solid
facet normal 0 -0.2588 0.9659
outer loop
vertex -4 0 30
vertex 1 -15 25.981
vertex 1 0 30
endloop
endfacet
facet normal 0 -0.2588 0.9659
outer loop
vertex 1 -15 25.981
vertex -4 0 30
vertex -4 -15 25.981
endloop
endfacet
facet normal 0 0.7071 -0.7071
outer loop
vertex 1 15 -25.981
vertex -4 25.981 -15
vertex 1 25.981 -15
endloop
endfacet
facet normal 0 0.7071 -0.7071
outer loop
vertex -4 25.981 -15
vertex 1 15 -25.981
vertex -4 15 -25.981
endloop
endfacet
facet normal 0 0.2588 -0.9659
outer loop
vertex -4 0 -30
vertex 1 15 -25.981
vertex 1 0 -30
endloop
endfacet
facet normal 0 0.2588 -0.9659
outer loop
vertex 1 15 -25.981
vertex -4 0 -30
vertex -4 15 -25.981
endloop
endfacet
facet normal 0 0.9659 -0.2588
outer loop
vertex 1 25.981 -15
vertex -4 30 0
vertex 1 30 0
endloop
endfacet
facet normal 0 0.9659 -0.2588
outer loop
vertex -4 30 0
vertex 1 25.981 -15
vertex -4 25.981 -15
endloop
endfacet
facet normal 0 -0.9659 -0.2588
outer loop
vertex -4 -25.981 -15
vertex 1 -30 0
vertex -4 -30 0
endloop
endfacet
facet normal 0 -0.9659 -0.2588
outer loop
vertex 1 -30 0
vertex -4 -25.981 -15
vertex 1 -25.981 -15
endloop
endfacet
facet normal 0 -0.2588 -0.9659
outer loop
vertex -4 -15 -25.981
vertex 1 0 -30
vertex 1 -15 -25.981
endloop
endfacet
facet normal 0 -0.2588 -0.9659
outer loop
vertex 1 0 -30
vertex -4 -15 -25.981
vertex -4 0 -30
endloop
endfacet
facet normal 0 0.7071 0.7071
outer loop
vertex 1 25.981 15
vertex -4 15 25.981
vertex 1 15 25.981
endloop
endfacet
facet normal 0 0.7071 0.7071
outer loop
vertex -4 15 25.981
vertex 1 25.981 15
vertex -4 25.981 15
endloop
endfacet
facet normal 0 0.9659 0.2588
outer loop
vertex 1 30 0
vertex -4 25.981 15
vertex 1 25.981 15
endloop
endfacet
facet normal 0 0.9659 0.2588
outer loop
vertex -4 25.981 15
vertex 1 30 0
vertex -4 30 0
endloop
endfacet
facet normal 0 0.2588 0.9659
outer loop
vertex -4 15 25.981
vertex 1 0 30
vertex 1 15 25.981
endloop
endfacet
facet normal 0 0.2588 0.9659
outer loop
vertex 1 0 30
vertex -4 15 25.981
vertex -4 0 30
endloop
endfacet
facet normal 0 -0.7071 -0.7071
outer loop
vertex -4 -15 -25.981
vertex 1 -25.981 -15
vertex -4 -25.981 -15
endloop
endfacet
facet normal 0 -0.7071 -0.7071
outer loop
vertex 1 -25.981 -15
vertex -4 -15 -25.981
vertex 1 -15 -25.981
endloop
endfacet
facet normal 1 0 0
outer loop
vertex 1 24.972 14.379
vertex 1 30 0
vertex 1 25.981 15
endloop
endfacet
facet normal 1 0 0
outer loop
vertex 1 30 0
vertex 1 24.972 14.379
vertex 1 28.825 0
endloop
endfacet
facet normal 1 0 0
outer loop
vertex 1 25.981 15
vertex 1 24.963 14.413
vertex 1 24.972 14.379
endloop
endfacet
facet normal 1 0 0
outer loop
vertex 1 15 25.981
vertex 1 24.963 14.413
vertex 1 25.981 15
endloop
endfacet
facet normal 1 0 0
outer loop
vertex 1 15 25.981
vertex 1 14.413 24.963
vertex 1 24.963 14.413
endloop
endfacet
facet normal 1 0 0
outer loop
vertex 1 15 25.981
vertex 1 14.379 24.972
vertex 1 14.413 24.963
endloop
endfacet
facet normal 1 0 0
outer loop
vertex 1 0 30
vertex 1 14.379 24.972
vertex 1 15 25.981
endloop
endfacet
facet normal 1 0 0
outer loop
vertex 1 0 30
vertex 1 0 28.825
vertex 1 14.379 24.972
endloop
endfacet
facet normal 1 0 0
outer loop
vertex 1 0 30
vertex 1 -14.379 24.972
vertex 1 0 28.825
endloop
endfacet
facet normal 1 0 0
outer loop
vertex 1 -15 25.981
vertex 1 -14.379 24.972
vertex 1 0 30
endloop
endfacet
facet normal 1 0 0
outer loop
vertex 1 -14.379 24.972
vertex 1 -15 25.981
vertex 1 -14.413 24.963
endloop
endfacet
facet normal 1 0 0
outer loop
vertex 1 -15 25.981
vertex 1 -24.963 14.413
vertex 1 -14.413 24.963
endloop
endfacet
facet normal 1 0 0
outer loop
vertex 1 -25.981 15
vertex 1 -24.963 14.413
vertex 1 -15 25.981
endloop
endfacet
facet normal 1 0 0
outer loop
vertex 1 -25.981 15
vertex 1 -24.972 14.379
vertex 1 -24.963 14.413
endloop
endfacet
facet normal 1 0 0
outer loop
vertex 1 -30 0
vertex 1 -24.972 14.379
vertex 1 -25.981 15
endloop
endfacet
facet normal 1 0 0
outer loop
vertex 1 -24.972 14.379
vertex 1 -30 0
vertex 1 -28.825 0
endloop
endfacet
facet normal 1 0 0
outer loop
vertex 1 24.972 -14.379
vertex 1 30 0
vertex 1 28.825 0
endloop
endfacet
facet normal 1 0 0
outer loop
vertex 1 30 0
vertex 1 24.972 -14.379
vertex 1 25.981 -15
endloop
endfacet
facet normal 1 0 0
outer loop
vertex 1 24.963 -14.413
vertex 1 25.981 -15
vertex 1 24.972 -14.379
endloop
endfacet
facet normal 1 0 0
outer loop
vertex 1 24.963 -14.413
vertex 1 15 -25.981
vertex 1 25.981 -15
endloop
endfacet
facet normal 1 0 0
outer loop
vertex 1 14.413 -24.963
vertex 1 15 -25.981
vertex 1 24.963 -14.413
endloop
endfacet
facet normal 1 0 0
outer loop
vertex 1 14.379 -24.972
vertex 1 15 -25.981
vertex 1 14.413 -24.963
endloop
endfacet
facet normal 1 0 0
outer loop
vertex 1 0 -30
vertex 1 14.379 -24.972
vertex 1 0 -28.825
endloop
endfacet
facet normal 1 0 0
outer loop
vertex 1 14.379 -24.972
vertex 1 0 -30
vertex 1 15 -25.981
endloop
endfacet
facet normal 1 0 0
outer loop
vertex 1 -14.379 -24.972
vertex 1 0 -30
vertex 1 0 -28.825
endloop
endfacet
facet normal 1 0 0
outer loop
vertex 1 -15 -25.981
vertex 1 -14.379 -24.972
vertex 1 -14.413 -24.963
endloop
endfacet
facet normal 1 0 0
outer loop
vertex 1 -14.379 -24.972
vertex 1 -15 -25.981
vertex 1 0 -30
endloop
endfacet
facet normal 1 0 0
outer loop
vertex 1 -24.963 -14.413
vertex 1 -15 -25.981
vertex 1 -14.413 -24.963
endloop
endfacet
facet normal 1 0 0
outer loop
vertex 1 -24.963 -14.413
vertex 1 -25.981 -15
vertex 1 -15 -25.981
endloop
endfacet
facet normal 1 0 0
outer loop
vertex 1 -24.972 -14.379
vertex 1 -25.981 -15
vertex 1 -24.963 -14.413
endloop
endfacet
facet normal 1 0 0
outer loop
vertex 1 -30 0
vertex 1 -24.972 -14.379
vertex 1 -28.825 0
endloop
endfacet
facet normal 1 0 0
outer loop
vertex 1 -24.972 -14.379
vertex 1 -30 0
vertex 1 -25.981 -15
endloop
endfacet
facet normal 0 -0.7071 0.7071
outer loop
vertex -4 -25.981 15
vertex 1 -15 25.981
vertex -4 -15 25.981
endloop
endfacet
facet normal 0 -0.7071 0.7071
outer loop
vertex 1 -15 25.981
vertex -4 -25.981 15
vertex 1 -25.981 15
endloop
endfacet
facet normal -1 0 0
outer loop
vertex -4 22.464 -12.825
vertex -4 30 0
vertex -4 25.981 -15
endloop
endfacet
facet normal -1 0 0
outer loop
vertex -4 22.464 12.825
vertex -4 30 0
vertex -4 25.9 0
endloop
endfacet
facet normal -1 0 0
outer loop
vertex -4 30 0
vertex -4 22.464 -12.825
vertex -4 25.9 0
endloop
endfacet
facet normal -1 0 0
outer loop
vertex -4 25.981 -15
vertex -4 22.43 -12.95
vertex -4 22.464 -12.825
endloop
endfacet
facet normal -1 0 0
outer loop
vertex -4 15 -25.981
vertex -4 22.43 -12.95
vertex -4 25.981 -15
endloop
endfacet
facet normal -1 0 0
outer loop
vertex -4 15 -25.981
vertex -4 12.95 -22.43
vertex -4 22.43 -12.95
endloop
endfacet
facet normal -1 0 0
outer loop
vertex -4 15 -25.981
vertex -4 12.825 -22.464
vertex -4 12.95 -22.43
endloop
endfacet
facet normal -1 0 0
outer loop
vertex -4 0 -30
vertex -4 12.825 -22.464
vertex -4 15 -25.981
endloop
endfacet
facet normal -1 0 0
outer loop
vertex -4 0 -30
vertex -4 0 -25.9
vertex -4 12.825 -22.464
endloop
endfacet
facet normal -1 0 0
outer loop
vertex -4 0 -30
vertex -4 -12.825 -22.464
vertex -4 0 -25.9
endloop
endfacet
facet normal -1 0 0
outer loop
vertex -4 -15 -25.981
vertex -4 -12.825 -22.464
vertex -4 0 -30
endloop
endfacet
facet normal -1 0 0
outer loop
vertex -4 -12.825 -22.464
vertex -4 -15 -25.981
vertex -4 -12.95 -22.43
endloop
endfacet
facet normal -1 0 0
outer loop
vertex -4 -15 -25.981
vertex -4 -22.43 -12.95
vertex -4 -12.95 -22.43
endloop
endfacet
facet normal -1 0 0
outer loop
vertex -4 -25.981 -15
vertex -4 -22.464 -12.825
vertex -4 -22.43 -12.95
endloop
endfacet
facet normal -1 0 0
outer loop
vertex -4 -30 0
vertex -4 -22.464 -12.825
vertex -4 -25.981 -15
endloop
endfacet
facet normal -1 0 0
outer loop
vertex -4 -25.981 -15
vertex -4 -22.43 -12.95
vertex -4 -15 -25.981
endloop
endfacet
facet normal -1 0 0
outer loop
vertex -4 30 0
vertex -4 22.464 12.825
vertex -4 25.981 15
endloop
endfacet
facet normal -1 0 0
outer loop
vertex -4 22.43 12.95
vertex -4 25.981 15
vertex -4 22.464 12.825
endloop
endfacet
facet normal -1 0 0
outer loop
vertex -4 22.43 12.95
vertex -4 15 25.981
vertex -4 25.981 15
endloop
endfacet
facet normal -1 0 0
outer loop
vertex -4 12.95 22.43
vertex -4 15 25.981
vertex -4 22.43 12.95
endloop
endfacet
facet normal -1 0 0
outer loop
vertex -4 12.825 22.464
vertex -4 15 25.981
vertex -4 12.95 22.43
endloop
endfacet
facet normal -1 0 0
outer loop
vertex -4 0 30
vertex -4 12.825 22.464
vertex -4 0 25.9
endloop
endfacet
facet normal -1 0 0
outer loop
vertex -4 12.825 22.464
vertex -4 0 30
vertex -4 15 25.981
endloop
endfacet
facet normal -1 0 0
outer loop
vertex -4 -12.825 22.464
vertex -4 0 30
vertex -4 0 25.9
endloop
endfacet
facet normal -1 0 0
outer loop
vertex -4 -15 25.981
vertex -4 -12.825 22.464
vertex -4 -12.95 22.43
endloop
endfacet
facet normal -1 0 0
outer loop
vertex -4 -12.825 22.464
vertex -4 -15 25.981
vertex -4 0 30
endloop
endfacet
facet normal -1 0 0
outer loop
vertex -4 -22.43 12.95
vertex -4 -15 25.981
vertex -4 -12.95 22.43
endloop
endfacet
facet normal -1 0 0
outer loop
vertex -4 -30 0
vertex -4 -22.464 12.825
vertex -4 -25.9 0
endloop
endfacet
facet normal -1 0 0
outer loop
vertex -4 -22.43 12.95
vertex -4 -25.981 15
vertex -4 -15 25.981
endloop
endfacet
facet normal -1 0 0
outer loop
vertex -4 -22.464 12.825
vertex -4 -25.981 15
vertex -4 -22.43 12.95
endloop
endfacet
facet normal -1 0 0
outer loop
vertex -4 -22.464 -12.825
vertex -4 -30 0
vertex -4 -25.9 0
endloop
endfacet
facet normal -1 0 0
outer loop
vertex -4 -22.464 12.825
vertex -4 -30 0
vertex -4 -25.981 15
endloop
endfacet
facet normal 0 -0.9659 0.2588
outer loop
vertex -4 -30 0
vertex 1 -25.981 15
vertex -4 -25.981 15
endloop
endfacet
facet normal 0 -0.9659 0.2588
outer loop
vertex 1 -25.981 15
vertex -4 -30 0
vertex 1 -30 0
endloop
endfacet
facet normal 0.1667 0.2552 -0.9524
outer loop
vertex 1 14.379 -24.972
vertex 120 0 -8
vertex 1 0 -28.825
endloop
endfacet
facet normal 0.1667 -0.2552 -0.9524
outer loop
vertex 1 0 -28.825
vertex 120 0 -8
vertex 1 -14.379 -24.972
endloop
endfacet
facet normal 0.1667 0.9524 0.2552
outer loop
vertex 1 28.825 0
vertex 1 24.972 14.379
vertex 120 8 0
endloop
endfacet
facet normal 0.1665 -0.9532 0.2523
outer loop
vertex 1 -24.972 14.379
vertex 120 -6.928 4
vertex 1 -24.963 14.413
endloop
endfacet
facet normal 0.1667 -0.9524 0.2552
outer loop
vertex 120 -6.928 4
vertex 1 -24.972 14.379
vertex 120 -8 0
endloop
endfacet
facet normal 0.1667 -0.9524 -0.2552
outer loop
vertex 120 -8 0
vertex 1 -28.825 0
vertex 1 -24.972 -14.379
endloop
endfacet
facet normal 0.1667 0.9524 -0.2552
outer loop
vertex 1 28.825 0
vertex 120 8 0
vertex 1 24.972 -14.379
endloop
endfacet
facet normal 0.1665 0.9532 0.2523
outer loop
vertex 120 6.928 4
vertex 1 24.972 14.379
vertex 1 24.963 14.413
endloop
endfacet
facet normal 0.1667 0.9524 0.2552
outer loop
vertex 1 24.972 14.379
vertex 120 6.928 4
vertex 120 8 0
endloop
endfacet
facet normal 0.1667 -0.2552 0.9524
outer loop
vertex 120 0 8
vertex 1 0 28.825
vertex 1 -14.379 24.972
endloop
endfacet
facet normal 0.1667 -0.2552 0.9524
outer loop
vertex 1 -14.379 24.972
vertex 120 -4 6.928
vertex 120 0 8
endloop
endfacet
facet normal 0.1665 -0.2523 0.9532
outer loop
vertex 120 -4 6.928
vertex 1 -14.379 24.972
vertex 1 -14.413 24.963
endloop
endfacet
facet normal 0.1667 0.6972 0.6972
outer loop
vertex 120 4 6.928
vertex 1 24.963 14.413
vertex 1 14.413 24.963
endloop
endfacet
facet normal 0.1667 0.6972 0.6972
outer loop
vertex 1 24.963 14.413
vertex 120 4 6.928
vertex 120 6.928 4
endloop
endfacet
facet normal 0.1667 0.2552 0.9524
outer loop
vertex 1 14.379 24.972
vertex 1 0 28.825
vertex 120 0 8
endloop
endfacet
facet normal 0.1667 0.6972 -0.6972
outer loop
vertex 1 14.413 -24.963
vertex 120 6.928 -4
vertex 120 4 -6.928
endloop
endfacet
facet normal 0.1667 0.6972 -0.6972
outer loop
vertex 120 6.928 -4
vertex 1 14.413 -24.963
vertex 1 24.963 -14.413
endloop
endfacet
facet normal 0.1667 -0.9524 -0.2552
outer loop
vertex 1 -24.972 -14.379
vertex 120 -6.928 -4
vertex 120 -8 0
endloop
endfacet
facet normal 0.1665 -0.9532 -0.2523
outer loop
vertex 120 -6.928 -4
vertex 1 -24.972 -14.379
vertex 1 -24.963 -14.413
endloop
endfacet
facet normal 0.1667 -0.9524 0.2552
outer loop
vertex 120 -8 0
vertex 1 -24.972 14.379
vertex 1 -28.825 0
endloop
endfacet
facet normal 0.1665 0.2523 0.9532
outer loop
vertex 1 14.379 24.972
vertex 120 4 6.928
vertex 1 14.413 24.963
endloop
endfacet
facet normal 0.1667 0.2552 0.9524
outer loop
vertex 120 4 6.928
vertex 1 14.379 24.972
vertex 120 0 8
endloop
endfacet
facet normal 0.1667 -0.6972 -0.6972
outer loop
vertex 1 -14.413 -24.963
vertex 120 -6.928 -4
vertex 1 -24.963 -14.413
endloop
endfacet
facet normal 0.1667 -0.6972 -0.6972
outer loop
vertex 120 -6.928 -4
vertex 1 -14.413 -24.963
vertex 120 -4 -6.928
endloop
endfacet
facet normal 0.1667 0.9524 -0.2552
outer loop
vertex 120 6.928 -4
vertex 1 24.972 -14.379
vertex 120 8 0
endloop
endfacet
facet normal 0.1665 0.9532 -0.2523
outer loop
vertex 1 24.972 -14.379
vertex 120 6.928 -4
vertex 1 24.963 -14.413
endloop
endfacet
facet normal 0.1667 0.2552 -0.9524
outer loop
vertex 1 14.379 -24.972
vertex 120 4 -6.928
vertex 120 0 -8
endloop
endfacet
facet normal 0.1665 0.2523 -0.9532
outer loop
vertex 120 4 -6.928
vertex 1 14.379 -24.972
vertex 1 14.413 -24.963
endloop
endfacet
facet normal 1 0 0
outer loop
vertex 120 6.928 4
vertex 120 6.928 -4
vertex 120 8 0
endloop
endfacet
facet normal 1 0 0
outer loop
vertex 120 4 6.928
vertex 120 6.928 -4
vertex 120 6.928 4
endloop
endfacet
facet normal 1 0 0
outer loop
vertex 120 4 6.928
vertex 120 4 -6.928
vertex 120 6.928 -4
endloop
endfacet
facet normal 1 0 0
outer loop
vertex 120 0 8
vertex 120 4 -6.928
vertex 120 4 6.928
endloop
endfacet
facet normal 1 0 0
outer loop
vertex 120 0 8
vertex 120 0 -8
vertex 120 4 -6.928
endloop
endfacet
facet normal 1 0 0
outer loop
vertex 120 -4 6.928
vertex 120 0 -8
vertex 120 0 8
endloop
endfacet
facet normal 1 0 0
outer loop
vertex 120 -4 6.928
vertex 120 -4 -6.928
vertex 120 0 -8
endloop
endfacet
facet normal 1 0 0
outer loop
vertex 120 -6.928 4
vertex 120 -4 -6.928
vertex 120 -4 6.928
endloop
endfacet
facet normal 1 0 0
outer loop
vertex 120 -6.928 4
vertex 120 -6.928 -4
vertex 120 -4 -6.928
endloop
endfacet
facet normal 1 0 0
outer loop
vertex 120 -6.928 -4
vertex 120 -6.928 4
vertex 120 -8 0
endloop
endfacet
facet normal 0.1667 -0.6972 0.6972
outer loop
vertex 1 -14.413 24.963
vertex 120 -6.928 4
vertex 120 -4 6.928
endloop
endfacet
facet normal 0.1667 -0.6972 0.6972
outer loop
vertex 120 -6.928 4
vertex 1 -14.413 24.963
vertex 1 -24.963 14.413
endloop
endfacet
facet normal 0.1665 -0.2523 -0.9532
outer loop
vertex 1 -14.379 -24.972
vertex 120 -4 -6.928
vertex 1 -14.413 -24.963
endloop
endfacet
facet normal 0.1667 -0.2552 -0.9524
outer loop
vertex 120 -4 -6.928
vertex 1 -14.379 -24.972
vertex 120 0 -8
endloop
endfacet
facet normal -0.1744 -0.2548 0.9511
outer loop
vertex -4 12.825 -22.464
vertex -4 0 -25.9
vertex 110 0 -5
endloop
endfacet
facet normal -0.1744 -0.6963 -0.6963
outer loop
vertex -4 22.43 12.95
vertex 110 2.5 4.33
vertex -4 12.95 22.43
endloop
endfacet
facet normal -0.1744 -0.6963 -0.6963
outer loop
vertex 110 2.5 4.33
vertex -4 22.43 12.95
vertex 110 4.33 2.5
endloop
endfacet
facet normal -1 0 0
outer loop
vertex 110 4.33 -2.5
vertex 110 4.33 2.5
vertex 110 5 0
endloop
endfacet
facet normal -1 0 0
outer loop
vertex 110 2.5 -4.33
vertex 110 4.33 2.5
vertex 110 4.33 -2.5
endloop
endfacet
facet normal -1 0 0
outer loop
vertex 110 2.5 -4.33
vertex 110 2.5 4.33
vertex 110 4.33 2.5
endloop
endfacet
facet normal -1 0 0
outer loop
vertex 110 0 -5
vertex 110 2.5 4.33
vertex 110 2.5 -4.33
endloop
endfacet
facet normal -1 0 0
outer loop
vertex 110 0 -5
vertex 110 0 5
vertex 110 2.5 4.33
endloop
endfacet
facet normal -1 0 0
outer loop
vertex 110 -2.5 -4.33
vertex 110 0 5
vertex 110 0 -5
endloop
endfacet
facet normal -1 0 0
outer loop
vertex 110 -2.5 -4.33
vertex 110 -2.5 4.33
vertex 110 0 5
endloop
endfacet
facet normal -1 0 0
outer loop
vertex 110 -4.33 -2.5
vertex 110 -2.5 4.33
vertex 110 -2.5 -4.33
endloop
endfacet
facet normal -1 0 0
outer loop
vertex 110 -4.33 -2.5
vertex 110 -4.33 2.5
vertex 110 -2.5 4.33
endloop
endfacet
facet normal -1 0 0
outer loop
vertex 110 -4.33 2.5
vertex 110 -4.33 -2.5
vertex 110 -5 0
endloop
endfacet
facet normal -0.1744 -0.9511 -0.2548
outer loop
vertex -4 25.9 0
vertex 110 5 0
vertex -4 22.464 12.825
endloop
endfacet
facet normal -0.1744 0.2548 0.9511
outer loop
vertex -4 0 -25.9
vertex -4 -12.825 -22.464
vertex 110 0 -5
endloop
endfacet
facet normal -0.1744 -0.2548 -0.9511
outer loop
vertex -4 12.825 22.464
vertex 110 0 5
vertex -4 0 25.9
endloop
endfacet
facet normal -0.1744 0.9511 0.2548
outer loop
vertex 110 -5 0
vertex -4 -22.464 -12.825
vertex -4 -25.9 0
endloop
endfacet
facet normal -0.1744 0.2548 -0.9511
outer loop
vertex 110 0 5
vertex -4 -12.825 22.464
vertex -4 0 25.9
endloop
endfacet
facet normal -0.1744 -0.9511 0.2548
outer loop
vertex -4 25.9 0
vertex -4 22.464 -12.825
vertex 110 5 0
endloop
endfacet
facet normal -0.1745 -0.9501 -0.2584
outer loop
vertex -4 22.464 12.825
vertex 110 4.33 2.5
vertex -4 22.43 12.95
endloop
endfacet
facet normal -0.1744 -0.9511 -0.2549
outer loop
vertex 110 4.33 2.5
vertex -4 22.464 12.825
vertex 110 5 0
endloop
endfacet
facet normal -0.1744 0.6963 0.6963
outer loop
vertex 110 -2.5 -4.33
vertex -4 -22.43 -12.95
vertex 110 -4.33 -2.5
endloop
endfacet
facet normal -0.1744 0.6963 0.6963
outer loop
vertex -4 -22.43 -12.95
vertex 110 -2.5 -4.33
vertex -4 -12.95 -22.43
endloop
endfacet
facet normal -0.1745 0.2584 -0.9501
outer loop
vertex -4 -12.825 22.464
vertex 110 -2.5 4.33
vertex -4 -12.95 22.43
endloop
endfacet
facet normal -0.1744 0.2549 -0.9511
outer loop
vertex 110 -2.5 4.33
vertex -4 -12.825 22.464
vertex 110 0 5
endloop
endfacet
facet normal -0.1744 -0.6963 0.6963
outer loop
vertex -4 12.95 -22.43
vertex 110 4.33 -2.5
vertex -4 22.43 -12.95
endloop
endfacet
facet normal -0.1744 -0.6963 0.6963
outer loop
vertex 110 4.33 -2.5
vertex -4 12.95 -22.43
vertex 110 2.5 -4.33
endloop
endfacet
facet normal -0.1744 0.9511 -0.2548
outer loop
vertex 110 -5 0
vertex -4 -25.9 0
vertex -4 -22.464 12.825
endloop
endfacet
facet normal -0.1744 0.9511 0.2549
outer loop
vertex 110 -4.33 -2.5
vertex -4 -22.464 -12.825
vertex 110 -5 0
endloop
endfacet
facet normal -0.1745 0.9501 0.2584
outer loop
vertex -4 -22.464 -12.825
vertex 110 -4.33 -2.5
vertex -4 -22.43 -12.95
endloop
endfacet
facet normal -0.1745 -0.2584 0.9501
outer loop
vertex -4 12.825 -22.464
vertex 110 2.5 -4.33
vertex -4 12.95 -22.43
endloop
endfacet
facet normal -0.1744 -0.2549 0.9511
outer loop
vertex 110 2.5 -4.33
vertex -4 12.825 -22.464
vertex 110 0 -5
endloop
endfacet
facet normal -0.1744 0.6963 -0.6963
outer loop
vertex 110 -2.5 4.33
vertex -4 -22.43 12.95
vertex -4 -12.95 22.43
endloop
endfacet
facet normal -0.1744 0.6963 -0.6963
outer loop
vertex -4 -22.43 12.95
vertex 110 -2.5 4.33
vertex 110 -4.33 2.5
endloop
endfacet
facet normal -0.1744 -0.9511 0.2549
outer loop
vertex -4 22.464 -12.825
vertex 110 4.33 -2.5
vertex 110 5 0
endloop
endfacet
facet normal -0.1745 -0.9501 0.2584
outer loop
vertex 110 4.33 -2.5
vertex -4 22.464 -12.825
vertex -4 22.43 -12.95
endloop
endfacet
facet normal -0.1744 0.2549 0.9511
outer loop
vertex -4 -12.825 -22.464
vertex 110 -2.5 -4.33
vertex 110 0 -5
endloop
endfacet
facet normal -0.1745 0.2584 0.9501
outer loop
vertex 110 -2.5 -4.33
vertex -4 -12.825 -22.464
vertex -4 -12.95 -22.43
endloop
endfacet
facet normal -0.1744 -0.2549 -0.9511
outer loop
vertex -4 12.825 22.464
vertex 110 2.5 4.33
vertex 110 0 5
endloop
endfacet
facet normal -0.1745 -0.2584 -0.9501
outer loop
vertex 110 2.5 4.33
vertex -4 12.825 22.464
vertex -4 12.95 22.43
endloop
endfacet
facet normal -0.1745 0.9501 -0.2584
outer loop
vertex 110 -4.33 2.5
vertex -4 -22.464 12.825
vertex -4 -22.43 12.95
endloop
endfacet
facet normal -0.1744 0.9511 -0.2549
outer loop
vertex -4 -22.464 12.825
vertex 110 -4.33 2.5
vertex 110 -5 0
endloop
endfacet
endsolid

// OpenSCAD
// file: imposter_docking_port.scad
module docking_port(x, y, z, rx, ry, rz, angle, scale) {
	translate([x,y,z]) {
		scale(v = [scale, scale, scale]) {
			rotate(v = [rx, ry, rz], a = angle) {
				rotate(v = [0, 1, 0], a = 90)
					union() {
						cylinder(h = 10, r1 = 30, r2 = 10);
						translate(v = [0, 0, -4]) {
							difference() {
								cylinder(h = 5, r1 = 30, r2 = 30);
								cylinder(h = 10, r1 = 36, r2 = 16, center = true);
							}
						}
					}
			}
		}
	}
}

module docking_port2(x, y, z, rx, ry, rz, angle, scale) {
	translate([x,y,z]) {
		scale(v = [scale, scale, scale]) {
			rotate(v = [rx, ry, rz], a = angle) {
				rotate(v = [0, 1, 0], a = 90)
					difference() {
					union() {
						cylinder(h = 10, r1 = 30, r2 = 10);
						translate(v = [0, 0, -4])
							cylinder(h = 5, r1 = 30, r2 = 30);
						cylinder(h = 120, r1 = 29, r2 = 8);
					}
					translate(v = [0, 0, -10])
						cylinder(h = 120, r1 = 27, r2 = 5);
					}
			}
		}
	}
}

module docking_port3(x, y, z, rx, ry, rz, angle, scale) {
	translate([x,y,z]) {
		scale(v = [scale, scale, scale]) {
			rotate(v = [rx, ry, rz], a = angle) {
				cylinder(h = sqrt(2) * 1, r1 = 1, r2 = 0, center = true, $fn = 3);
			}
		}
	}
}
// main file
$fn=12;

use <imposter_docking_port.scad>;

docking_port2(0, 0, 0, 0, 0, 1, 0, 1.0);
